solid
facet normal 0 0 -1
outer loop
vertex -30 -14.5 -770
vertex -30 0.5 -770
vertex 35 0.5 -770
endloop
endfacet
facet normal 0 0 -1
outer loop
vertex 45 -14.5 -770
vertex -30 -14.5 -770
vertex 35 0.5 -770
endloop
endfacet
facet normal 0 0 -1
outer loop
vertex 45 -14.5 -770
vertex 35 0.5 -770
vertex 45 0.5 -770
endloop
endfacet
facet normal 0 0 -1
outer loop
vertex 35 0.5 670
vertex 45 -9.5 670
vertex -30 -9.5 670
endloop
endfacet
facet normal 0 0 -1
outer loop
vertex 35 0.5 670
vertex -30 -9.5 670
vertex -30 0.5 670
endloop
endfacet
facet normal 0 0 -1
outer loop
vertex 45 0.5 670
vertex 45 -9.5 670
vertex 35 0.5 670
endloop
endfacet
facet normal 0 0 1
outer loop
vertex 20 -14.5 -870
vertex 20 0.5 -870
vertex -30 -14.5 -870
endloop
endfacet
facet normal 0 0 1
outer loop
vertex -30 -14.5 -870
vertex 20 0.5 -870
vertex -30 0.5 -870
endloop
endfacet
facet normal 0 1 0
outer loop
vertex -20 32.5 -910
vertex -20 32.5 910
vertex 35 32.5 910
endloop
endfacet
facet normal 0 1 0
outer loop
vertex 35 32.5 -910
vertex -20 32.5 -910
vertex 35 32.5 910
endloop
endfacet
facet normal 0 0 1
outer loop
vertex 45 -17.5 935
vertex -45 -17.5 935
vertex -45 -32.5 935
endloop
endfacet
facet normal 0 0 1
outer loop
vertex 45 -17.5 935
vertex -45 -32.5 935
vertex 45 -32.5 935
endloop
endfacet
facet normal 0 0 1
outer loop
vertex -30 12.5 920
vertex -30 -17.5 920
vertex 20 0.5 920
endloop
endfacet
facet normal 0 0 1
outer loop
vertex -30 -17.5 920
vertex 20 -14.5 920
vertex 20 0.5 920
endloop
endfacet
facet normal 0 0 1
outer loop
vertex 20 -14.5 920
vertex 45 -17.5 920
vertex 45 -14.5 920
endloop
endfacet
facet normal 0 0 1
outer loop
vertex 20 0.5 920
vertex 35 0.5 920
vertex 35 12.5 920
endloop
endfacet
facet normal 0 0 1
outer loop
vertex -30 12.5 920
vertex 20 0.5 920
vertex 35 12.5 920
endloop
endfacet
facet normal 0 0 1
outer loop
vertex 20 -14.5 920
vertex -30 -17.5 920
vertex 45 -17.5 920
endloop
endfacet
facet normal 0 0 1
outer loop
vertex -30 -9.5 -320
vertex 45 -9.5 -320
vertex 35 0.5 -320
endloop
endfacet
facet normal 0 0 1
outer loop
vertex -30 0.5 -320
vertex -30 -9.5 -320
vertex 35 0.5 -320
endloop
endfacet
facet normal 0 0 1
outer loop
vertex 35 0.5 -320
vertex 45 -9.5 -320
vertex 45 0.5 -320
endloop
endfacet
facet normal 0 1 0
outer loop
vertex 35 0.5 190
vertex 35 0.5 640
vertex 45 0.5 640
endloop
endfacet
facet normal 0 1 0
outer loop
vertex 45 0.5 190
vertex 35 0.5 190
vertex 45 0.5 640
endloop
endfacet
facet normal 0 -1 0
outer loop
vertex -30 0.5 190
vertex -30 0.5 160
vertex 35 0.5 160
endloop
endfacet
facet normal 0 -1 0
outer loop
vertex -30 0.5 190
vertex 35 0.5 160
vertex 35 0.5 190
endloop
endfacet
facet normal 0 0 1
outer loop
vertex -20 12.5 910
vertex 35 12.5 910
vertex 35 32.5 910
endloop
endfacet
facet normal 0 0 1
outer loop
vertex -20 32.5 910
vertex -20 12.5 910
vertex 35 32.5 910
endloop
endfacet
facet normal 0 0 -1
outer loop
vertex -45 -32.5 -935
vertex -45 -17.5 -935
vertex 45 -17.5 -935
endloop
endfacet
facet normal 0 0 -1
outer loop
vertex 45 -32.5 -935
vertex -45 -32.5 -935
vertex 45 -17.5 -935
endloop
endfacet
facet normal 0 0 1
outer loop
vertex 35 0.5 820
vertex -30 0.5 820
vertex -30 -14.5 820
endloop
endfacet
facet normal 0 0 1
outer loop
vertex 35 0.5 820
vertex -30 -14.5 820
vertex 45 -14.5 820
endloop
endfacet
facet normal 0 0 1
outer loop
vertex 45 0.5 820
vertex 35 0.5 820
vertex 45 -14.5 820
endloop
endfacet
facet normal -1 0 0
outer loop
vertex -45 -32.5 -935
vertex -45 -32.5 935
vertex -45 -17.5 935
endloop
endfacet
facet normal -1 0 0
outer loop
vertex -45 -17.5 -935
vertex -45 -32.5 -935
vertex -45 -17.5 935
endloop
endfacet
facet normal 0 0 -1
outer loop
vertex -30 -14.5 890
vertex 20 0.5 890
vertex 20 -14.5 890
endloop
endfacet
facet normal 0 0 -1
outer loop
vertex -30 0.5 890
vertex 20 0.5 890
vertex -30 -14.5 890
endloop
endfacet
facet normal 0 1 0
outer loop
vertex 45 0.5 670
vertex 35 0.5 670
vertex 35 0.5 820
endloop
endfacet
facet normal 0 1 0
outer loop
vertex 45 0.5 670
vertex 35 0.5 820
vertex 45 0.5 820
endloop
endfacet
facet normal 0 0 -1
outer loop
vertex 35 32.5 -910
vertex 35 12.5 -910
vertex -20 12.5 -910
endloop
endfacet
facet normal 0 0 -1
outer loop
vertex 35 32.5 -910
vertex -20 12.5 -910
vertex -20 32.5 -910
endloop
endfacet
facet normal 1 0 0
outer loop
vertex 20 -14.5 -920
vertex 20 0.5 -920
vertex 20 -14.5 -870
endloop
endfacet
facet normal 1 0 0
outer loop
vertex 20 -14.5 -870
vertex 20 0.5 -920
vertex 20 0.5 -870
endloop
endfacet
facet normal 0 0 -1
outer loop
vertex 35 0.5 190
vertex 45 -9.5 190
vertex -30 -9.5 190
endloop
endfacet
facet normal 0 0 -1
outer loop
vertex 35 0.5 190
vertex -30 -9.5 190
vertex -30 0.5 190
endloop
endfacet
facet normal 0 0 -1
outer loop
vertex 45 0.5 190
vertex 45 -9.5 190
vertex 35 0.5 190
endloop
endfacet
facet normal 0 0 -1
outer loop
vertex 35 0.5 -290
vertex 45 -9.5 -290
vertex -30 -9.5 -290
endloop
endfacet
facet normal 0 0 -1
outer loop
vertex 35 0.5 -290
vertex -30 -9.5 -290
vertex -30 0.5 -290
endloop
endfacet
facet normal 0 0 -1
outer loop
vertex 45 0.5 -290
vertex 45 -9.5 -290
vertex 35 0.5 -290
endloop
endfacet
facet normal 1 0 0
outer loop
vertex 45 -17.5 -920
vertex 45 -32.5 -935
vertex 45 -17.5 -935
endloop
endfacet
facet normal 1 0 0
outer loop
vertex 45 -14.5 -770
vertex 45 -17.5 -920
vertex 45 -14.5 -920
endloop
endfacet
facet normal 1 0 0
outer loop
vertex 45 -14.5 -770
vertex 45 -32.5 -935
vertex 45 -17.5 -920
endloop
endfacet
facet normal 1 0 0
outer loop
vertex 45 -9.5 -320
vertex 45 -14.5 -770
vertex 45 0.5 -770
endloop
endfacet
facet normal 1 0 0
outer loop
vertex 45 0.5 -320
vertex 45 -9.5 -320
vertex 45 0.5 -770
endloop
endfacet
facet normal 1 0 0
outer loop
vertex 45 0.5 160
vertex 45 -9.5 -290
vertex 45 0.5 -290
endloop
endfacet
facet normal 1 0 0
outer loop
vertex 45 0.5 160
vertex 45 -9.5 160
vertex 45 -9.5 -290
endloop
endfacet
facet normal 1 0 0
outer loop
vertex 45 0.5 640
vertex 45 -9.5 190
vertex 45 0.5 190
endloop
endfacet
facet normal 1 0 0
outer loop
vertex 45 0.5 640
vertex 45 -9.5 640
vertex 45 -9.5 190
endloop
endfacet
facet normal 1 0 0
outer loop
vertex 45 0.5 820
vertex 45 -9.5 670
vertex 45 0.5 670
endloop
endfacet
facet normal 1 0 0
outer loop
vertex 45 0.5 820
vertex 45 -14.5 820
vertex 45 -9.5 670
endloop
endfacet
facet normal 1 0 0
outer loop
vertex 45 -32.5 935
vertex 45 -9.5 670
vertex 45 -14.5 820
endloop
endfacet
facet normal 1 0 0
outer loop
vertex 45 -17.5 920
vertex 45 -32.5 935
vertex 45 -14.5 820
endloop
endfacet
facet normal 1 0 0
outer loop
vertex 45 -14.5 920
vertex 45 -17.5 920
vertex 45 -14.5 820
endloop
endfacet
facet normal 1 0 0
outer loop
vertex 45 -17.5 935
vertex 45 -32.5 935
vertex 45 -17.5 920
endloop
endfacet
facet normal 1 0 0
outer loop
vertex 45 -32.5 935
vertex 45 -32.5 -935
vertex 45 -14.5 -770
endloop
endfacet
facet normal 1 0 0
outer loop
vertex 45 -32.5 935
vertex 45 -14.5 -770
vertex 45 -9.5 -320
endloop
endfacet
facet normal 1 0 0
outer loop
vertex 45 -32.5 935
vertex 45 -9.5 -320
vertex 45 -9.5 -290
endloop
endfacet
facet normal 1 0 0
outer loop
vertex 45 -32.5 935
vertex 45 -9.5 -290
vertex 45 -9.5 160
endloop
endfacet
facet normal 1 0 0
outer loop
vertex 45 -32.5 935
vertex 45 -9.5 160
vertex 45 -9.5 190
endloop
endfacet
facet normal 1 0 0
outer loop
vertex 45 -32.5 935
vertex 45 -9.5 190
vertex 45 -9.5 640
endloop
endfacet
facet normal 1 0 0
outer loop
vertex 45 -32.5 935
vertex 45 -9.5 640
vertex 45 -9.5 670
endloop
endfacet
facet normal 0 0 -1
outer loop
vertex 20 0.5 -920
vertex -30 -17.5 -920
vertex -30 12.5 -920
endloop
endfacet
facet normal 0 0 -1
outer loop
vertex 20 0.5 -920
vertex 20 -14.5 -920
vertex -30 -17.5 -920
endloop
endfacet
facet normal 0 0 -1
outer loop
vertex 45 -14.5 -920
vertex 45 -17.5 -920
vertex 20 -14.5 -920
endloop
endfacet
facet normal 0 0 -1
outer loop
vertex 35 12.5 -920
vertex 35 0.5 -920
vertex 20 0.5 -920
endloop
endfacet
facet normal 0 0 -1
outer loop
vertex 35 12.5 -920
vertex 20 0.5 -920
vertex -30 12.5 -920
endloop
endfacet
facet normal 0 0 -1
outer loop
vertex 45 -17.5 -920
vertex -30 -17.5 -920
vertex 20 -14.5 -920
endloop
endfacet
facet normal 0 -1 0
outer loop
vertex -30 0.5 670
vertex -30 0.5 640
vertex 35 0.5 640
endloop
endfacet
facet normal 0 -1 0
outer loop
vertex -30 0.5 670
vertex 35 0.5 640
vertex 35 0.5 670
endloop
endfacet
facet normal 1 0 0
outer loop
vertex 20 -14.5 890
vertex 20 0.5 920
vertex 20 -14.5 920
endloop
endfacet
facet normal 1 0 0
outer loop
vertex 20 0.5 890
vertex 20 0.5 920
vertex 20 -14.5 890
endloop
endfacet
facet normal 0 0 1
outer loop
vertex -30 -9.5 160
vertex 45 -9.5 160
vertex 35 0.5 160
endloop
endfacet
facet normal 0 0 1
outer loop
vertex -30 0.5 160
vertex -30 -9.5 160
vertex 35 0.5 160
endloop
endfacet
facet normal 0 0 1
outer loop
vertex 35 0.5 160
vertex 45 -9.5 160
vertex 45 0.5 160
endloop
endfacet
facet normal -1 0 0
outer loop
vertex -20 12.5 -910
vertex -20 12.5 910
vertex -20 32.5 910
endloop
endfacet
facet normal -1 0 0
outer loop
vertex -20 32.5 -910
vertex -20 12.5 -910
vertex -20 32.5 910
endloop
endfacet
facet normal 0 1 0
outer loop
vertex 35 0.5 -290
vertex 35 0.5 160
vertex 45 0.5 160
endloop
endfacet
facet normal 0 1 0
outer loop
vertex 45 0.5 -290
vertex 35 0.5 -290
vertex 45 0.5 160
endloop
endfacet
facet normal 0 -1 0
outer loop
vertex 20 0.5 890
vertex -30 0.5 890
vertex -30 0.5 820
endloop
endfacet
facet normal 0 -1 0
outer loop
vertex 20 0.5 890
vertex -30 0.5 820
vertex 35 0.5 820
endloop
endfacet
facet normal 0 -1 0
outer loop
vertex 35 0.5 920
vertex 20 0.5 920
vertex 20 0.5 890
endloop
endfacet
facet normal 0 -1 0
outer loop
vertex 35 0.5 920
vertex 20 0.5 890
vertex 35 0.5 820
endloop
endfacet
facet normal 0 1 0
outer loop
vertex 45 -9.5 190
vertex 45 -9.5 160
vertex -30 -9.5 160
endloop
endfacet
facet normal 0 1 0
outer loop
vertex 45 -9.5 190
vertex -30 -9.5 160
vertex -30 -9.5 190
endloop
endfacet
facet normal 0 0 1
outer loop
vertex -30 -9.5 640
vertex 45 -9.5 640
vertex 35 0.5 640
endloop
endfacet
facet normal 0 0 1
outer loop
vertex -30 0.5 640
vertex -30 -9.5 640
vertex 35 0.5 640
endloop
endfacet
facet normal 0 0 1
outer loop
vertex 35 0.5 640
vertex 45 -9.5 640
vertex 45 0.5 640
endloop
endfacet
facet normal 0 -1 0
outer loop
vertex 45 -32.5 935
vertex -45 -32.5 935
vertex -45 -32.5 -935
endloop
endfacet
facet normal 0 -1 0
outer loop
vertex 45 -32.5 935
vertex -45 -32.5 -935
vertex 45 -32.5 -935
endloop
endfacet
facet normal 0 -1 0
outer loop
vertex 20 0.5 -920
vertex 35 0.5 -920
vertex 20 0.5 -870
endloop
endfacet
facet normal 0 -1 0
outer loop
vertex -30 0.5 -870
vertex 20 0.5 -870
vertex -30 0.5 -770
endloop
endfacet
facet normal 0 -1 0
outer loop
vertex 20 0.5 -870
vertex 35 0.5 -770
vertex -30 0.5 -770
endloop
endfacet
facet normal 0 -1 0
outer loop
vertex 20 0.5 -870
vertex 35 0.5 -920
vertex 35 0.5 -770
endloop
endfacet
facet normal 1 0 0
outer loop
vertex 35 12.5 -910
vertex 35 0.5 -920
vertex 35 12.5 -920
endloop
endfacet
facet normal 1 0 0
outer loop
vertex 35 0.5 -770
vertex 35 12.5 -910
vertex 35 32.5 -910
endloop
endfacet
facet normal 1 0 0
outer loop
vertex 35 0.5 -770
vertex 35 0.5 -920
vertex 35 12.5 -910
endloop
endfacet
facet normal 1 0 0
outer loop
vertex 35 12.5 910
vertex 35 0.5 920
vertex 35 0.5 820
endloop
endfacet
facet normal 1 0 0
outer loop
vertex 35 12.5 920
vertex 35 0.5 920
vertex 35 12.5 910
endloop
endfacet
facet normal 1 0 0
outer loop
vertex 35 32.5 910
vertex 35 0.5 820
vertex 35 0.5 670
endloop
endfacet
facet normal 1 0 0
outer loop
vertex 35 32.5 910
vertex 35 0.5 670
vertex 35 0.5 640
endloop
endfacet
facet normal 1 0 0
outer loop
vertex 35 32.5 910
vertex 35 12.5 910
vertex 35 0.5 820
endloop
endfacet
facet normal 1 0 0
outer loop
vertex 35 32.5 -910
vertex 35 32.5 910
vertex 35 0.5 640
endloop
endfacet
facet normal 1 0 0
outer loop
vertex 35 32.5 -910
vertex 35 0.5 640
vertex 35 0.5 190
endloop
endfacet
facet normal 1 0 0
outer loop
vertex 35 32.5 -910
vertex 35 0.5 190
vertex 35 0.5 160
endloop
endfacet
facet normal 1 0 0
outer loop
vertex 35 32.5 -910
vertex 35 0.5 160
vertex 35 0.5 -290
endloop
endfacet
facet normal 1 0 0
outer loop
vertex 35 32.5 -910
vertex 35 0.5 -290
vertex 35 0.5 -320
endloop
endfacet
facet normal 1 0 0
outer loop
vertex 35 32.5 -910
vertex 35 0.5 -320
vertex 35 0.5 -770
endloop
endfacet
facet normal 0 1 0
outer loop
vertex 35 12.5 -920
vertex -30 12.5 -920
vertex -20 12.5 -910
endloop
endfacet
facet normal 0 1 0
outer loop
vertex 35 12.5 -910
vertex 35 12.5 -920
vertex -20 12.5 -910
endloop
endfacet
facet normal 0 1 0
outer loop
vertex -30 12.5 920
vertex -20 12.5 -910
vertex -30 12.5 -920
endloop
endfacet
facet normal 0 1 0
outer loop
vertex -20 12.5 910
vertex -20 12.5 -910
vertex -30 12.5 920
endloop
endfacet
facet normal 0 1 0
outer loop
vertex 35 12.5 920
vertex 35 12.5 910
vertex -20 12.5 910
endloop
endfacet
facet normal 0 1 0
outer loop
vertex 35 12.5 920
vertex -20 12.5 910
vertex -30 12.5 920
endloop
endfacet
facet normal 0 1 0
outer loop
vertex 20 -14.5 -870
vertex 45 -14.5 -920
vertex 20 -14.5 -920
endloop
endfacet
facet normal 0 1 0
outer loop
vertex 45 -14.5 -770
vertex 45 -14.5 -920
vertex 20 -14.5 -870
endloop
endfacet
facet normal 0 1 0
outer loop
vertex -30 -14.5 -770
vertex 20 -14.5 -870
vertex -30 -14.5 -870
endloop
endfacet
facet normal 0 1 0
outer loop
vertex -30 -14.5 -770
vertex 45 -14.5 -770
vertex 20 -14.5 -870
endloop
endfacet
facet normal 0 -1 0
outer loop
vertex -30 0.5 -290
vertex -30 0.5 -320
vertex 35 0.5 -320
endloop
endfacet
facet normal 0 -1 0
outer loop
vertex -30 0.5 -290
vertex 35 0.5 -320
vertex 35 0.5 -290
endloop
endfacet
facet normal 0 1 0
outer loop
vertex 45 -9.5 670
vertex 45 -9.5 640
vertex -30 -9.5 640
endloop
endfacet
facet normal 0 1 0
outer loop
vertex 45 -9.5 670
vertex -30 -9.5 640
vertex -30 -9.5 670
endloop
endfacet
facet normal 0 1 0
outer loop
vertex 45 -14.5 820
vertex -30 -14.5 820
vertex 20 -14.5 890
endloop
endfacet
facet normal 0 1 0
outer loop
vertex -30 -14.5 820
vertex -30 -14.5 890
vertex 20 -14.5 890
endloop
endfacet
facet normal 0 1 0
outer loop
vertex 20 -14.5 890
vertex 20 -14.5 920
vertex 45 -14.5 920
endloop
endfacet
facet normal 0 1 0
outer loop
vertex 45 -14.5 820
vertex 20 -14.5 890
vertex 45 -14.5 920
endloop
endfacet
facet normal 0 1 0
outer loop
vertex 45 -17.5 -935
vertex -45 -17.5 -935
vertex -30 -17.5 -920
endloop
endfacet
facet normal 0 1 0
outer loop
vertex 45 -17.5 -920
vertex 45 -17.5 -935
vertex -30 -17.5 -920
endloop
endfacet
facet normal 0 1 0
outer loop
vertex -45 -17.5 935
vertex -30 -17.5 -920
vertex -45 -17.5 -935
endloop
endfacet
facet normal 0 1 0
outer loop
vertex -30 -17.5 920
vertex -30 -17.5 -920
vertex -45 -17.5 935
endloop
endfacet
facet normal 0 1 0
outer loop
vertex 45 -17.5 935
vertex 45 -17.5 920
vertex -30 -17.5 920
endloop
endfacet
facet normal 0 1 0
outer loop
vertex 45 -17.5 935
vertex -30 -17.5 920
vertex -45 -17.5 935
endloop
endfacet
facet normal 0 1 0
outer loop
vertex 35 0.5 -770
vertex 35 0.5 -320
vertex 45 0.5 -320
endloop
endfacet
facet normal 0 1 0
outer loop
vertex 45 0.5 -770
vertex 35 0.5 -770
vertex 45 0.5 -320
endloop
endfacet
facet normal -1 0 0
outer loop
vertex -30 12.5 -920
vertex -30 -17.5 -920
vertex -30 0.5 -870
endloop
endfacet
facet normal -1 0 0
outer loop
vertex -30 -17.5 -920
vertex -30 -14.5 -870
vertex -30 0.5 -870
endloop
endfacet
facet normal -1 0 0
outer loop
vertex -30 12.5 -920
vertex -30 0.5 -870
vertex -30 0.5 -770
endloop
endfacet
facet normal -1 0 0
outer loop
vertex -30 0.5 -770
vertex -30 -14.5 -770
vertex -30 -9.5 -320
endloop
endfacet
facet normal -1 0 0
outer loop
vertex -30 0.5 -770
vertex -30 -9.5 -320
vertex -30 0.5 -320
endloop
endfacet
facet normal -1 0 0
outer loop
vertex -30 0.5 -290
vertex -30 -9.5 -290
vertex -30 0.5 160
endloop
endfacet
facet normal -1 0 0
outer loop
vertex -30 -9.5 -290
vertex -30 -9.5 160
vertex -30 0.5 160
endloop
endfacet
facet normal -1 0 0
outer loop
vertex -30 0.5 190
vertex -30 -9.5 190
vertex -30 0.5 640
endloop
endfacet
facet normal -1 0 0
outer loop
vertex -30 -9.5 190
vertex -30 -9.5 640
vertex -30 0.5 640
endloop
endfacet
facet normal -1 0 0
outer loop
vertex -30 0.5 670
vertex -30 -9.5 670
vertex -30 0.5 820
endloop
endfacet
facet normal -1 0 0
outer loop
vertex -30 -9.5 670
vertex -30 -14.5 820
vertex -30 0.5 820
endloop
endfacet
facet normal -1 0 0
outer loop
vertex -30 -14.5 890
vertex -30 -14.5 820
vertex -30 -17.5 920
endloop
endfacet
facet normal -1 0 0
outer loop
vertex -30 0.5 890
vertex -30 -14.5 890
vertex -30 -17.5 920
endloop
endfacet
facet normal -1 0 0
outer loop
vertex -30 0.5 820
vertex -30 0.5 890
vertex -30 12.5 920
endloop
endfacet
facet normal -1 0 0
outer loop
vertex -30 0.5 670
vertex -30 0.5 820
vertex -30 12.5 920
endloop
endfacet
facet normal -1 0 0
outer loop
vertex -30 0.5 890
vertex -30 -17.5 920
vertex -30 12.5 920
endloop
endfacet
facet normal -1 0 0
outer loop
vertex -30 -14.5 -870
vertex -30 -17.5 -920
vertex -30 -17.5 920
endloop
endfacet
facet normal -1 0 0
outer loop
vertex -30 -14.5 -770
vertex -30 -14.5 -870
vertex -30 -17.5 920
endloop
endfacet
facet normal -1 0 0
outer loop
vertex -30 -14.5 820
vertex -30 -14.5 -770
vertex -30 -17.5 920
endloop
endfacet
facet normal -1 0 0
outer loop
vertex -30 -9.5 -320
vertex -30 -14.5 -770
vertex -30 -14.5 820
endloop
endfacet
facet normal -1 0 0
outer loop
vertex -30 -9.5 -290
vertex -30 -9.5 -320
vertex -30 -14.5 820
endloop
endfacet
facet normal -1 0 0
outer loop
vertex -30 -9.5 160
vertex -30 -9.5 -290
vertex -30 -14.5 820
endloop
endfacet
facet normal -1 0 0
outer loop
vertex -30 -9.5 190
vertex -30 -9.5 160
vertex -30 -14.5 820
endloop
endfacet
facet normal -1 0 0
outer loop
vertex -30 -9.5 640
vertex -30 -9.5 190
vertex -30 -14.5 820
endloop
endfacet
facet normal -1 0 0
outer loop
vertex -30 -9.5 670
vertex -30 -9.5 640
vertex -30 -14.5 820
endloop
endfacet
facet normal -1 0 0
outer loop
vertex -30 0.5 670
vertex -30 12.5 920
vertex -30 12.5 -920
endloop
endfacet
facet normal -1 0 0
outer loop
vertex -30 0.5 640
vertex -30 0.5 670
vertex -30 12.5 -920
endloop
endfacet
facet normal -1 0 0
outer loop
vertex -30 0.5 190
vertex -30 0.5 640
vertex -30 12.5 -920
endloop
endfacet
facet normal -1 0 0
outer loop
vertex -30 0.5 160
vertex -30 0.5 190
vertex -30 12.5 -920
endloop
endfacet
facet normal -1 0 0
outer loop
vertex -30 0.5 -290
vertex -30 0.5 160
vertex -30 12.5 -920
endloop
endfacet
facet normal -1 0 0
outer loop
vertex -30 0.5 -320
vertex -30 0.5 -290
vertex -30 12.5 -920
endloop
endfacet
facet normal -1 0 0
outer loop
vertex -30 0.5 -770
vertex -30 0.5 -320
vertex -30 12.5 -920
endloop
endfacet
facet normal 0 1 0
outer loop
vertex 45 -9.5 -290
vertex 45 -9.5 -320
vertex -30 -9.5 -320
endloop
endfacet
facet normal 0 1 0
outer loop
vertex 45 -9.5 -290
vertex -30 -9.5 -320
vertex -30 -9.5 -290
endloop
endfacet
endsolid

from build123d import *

# Parameters (mm, degrees)
SKETCH003_W     = 90
SKETCH003_H     = 65
PAD001_DEPTH    = 1870
POCKET016_DEPTH = 15
POCKET018_DEPTH = 15
SKETCH006_W     = 10
SKETCH006_H     = 30
POCKET004_DEPTH = 90.001
SKETCH007_W     = 20
SKETCH007_H     = 25
POCKET005_DEPTH = 3836.586112
SKETCH008_W     = 50
SKETCH008_H     = 15
POCKET006_DEPTH = 3836.586112
SKETCH009_W     = 25
SKETCH009_H     = 20
POCKET007_DEPTH = 1870.001
SKETCH010_W     = 15
SKETCH010_H     = 50
POCKET008_DEPTH = 1870.001
SKETCH020_W     = 10
SKETCH020_H     = 32
POCKET017_DEPTH = 1870.001


with BuildPart() as part:
    # Sketch003 (on DatumPlane) → Pad001 (new body)
    with BuildSketch(Plane.XY.offset(935)):
        Rectangle(SKETCH003_W, SKETCH003_H)
    extrude(amount=-PAD001_DEPTH)

    # Sketch019 (on DatumPlane) → Pocket016 (cut)
    with BuildSketch(Plane(origin=(0, 0.5, 0), x_dir=(-1, 0, 0), z_dir=(0, 1, 0))):
        Polygon((-45, 935), (-20, 935), (-20, 890), (45, 890), (45, 820), (-45, 820), align=None)
    extrude(amount=-POCKET016_DEPTH, mode=Mode.SUBTRACT)

    # Sketch021 (on DatumPlane) → Pocket018 (cut)
    with BuildSketch(Plane(origin=(0, 0.5, 0), x_dir=(-1, 0, 0), z_dir=(0, 1, 0))):
        Polygon((45, -770), (-45, -770), (-45, -935), (-20, -935), (-20, -870), (45, -870), align=None)
    extrude(amount=-POCKET018_DEPTH, mode=Mode.SUBTRACT)

    # Sketch006 (on DatumPlane) → Pocket004 (cut, through all)
    with BuildSketch(Plane.YZ.offset(45)):
        with Locations((-4.5, -305)):
            Rectangle(SKETCH006_W, SKETCH006_H)
        with Locations((-4.5, 175)):
            Rectangle(SKETCH006_W, SKETCH006_H)
        with Locations((-4.5, 655)):
            Rectangle(SKETCH006_W, SKETCH006_H)
    extrude(amount=-POCKET004_DEPTH, mode=Mode.SUBTRACT)

    # Sketch007 (on DatumPlane) → Pocket005 (cut, through all)
    with BuildSketch(Plane.YZ.offset(45)):
        with Locations((22.5, 922.5)):
            Rectangle(SKETCH007_W, SKETCH007_H)
    pocket005 = extrude(amount=-POCKET005_DEPTH, mode=Mode.SUBTRACT)

    # Sketch008 (on DatumPlane) → Pocket006 (cut, through all)
    with BuildSketch(Plane.YZ.offset(45)):
        with Locations((7.5, 927.5)):
            Rectangle(SKETCH008_W, SKETCH008_H)
    pocket006 = extrude(amount=-POCKET006_DEPTH, mode=Mode.SUBTRACT)

    # Mirrored002: Pocket005, Pocket006 across XY
    add(pocket005.mirror(Plane.XY), mode=Mode.SUBTRACT)
    add(pocket006.mirror(Plane.XY), mode=Mode.SUBTRACT)

    # Sketch009 (on DatumPlane) → Pocket007 (cut, through all)
    with BuildSketch(Plane.XY.offset(935)):
        with Locations((-32.5, 22.5)):
            Rectangle(SKETCH009_W, SKETCH009_H)
    extrude(amount=-POCKET007_DEPTH, mode=Mode.SUBTRACT)

    # Sketch010 (on Plane of DatumPlane003) → Pocket008 (cut, through all)
    with BuildSketch(Plane.XY.offset(935)):
        with Locations((-37.5, 7.5)):
            Rectangle(SKETCH010_W, SKETCH010_H)
    extrude(amount=-POCKET008_DEPTH, mode=Mode.SUBTRACT)

    # Sketch020 (on DatumPlane) → Pocket017 (cut, through all)
    with BuildSketch(Plane.XY.offset(935)):
        with Locations((40, 16.5)):
            Rectangle(SKETCH020_W, SKETCH020_H)
    extrude(amount=-POCKET017_DEPTH, mode=Mode.SUBTRACT)


solid = part.part
